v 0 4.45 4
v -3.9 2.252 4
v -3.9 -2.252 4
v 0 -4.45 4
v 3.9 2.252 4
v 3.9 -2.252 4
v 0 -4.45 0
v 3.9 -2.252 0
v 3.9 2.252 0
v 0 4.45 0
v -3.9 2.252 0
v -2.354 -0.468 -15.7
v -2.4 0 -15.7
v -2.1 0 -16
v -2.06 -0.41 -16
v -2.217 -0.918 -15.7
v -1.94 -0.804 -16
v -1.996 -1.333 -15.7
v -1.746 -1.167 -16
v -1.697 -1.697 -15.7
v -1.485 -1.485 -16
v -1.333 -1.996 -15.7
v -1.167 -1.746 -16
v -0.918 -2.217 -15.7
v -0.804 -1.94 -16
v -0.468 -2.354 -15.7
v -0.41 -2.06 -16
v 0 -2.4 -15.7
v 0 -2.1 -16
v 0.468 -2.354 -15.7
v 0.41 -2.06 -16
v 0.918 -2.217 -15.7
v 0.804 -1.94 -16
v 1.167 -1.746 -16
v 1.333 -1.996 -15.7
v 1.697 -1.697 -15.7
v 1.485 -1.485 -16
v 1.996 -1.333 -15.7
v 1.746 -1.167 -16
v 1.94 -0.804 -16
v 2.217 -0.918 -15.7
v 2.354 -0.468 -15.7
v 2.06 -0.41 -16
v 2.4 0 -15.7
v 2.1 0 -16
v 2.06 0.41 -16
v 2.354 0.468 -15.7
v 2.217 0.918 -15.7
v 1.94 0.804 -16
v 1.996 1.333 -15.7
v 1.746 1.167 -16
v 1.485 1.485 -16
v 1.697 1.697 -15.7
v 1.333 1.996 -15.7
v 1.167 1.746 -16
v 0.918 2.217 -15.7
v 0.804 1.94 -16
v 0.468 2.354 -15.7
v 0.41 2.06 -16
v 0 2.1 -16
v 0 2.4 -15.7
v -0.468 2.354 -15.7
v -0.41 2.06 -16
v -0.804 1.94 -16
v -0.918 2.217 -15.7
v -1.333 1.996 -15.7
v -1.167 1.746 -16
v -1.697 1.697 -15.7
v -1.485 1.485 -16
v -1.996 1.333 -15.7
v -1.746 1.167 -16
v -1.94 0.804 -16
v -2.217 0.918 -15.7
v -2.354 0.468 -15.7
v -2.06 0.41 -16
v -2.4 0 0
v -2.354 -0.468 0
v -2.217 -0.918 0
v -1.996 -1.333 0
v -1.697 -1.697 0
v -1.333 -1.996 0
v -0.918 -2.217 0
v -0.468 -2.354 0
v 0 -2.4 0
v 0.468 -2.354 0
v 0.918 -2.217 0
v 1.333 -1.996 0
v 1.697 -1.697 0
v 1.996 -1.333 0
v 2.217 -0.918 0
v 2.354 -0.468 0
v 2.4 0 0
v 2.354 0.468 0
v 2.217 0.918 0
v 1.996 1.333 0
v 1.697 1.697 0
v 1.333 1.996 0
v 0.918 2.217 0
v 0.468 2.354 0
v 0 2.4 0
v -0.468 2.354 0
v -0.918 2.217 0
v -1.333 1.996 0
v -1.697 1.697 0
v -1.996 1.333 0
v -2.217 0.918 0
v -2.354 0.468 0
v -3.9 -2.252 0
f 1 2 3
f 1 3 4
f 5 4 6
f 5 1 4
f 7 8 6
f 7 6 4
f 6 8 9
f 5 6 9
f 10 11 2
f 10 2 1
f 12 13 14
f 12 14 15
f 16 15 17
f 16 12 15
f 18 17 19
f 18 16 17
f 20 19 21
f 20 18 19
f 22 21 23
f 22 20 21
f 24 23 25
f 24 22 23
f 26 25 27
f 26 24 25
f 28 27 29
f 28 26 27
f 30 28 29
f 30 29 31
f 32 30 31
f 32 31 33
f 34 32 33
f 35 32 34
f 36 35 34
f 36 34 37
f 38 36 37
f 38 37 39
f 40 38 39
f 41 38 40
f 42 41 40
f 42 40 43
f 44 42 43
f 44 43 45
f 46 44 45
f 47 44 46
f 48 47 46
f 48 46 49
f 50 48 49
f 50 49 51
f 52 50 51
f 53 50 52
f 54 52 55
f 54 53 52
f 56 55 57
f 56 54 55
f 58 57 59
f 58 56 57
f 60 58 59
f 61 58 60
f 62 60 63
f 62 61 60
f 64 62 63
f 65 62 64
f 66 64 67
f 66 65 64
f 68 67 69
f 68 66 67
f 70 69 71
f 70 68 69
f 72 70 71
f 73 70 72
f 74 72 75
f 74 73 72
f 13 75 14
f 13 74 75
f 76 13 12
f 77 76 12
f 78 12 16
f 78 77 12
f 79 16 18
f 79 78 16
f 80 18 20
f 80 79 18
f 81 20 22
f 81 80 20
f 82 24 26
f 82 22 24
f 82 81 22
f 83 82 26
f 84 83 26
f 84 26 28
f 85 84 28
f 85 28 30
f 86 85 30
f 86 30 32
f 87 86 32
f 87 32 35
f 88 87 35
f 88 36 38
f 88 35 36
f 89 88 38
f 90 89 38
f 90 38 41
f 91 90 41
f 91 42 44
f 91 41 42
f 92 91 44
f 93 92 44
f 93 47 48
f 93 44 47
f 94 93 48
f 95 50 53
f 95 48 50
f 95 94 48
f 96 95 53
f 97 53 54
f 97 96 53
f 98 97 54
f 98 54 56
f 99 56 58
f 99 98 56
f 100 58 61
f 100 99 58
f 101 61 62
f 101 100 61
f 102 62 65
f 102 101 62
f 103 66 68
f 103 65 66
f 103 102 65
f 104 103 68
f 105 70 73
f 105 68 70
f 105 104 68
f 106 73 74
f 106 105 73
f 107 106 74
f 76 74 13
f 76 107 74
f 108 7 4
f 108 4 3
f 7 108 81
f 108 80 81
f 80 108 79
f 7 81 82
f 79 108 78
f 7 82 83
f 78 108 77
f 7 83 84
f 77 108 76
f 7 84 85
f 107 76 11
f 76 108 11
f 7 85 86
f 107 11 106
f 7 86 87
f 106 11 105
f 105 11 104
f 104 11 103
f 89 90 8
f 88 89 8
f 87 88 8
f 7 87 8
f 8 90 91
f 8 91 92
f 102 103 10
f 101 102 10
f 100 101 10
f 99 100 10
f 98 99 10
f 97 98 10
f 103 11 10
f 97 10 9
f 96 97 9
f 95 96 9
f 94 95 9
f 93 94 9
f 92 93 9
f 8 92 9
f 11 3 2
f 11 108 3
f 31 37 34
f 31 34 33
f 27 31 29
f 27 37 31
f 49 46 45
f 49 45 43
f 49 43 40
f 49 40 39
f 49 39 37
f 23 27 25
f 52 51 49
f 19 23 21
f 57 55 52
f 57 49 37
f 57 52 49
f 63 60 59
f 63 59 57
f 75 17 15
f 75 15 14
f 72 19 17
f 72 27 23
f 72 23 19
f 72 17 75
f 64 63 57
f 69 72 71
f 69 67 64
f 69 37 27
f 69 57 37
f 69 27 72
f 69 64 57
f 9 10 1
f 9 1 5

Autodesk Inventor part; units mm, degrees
ref_plane "YZ Plane" through (0, 0, 0) normal (1, 0, 0) x (0, 1, 0)
ref_plane "XZ Plane" through (0, 0, 0) normal (0, 1, 0) x (-1, 0, 0)
ref_plane "XY Plane" through (0, 0, 0) normal (0, 0, 1) x (1, 0, 0)
sketch "Эскиз1" plane through (0, 0, 0) normal (0, 0, 1) x (1, 0, 0)
  line L0 (0, -4.45) -> (-3.9, -2.2517)
  line L1 (3.9, -2.2517) -> (0, -4.45)
  line L2 (0, 4.45) -> (3.9, 2.2517)
  line L3 (-3.9, 2.2517) -> (0, 4.45)
  line L4 (-3.9, -2.2517) -> (-3.9, 2.2517)
  line L5 (3.9, -2.2517) -> (3.9, 2.2517)
  point P0 (0, 0)
extrude "Выдавливание1" add sketch "Эскиз1" along normal blind 4
sketch "Эскиз2" plane through (0, 0, 0) normal (0, 0, -1) x (-1, 0, 0)
  circle A0 centre (0, 0) radius 2.4
  dimension "d2" = 4.8
extrude "Выдавливание2" add sketch "Эскиз2" along normal blind 16
thread "Резьба1" size "M5x0.8" class "6g" standard "ANSI Metric M Profile" full length
chamfer "Фаска1" distance 0.3 angle 45 1 edges at (2.4, 0, -16)
properties part number "Болт М5х16"
